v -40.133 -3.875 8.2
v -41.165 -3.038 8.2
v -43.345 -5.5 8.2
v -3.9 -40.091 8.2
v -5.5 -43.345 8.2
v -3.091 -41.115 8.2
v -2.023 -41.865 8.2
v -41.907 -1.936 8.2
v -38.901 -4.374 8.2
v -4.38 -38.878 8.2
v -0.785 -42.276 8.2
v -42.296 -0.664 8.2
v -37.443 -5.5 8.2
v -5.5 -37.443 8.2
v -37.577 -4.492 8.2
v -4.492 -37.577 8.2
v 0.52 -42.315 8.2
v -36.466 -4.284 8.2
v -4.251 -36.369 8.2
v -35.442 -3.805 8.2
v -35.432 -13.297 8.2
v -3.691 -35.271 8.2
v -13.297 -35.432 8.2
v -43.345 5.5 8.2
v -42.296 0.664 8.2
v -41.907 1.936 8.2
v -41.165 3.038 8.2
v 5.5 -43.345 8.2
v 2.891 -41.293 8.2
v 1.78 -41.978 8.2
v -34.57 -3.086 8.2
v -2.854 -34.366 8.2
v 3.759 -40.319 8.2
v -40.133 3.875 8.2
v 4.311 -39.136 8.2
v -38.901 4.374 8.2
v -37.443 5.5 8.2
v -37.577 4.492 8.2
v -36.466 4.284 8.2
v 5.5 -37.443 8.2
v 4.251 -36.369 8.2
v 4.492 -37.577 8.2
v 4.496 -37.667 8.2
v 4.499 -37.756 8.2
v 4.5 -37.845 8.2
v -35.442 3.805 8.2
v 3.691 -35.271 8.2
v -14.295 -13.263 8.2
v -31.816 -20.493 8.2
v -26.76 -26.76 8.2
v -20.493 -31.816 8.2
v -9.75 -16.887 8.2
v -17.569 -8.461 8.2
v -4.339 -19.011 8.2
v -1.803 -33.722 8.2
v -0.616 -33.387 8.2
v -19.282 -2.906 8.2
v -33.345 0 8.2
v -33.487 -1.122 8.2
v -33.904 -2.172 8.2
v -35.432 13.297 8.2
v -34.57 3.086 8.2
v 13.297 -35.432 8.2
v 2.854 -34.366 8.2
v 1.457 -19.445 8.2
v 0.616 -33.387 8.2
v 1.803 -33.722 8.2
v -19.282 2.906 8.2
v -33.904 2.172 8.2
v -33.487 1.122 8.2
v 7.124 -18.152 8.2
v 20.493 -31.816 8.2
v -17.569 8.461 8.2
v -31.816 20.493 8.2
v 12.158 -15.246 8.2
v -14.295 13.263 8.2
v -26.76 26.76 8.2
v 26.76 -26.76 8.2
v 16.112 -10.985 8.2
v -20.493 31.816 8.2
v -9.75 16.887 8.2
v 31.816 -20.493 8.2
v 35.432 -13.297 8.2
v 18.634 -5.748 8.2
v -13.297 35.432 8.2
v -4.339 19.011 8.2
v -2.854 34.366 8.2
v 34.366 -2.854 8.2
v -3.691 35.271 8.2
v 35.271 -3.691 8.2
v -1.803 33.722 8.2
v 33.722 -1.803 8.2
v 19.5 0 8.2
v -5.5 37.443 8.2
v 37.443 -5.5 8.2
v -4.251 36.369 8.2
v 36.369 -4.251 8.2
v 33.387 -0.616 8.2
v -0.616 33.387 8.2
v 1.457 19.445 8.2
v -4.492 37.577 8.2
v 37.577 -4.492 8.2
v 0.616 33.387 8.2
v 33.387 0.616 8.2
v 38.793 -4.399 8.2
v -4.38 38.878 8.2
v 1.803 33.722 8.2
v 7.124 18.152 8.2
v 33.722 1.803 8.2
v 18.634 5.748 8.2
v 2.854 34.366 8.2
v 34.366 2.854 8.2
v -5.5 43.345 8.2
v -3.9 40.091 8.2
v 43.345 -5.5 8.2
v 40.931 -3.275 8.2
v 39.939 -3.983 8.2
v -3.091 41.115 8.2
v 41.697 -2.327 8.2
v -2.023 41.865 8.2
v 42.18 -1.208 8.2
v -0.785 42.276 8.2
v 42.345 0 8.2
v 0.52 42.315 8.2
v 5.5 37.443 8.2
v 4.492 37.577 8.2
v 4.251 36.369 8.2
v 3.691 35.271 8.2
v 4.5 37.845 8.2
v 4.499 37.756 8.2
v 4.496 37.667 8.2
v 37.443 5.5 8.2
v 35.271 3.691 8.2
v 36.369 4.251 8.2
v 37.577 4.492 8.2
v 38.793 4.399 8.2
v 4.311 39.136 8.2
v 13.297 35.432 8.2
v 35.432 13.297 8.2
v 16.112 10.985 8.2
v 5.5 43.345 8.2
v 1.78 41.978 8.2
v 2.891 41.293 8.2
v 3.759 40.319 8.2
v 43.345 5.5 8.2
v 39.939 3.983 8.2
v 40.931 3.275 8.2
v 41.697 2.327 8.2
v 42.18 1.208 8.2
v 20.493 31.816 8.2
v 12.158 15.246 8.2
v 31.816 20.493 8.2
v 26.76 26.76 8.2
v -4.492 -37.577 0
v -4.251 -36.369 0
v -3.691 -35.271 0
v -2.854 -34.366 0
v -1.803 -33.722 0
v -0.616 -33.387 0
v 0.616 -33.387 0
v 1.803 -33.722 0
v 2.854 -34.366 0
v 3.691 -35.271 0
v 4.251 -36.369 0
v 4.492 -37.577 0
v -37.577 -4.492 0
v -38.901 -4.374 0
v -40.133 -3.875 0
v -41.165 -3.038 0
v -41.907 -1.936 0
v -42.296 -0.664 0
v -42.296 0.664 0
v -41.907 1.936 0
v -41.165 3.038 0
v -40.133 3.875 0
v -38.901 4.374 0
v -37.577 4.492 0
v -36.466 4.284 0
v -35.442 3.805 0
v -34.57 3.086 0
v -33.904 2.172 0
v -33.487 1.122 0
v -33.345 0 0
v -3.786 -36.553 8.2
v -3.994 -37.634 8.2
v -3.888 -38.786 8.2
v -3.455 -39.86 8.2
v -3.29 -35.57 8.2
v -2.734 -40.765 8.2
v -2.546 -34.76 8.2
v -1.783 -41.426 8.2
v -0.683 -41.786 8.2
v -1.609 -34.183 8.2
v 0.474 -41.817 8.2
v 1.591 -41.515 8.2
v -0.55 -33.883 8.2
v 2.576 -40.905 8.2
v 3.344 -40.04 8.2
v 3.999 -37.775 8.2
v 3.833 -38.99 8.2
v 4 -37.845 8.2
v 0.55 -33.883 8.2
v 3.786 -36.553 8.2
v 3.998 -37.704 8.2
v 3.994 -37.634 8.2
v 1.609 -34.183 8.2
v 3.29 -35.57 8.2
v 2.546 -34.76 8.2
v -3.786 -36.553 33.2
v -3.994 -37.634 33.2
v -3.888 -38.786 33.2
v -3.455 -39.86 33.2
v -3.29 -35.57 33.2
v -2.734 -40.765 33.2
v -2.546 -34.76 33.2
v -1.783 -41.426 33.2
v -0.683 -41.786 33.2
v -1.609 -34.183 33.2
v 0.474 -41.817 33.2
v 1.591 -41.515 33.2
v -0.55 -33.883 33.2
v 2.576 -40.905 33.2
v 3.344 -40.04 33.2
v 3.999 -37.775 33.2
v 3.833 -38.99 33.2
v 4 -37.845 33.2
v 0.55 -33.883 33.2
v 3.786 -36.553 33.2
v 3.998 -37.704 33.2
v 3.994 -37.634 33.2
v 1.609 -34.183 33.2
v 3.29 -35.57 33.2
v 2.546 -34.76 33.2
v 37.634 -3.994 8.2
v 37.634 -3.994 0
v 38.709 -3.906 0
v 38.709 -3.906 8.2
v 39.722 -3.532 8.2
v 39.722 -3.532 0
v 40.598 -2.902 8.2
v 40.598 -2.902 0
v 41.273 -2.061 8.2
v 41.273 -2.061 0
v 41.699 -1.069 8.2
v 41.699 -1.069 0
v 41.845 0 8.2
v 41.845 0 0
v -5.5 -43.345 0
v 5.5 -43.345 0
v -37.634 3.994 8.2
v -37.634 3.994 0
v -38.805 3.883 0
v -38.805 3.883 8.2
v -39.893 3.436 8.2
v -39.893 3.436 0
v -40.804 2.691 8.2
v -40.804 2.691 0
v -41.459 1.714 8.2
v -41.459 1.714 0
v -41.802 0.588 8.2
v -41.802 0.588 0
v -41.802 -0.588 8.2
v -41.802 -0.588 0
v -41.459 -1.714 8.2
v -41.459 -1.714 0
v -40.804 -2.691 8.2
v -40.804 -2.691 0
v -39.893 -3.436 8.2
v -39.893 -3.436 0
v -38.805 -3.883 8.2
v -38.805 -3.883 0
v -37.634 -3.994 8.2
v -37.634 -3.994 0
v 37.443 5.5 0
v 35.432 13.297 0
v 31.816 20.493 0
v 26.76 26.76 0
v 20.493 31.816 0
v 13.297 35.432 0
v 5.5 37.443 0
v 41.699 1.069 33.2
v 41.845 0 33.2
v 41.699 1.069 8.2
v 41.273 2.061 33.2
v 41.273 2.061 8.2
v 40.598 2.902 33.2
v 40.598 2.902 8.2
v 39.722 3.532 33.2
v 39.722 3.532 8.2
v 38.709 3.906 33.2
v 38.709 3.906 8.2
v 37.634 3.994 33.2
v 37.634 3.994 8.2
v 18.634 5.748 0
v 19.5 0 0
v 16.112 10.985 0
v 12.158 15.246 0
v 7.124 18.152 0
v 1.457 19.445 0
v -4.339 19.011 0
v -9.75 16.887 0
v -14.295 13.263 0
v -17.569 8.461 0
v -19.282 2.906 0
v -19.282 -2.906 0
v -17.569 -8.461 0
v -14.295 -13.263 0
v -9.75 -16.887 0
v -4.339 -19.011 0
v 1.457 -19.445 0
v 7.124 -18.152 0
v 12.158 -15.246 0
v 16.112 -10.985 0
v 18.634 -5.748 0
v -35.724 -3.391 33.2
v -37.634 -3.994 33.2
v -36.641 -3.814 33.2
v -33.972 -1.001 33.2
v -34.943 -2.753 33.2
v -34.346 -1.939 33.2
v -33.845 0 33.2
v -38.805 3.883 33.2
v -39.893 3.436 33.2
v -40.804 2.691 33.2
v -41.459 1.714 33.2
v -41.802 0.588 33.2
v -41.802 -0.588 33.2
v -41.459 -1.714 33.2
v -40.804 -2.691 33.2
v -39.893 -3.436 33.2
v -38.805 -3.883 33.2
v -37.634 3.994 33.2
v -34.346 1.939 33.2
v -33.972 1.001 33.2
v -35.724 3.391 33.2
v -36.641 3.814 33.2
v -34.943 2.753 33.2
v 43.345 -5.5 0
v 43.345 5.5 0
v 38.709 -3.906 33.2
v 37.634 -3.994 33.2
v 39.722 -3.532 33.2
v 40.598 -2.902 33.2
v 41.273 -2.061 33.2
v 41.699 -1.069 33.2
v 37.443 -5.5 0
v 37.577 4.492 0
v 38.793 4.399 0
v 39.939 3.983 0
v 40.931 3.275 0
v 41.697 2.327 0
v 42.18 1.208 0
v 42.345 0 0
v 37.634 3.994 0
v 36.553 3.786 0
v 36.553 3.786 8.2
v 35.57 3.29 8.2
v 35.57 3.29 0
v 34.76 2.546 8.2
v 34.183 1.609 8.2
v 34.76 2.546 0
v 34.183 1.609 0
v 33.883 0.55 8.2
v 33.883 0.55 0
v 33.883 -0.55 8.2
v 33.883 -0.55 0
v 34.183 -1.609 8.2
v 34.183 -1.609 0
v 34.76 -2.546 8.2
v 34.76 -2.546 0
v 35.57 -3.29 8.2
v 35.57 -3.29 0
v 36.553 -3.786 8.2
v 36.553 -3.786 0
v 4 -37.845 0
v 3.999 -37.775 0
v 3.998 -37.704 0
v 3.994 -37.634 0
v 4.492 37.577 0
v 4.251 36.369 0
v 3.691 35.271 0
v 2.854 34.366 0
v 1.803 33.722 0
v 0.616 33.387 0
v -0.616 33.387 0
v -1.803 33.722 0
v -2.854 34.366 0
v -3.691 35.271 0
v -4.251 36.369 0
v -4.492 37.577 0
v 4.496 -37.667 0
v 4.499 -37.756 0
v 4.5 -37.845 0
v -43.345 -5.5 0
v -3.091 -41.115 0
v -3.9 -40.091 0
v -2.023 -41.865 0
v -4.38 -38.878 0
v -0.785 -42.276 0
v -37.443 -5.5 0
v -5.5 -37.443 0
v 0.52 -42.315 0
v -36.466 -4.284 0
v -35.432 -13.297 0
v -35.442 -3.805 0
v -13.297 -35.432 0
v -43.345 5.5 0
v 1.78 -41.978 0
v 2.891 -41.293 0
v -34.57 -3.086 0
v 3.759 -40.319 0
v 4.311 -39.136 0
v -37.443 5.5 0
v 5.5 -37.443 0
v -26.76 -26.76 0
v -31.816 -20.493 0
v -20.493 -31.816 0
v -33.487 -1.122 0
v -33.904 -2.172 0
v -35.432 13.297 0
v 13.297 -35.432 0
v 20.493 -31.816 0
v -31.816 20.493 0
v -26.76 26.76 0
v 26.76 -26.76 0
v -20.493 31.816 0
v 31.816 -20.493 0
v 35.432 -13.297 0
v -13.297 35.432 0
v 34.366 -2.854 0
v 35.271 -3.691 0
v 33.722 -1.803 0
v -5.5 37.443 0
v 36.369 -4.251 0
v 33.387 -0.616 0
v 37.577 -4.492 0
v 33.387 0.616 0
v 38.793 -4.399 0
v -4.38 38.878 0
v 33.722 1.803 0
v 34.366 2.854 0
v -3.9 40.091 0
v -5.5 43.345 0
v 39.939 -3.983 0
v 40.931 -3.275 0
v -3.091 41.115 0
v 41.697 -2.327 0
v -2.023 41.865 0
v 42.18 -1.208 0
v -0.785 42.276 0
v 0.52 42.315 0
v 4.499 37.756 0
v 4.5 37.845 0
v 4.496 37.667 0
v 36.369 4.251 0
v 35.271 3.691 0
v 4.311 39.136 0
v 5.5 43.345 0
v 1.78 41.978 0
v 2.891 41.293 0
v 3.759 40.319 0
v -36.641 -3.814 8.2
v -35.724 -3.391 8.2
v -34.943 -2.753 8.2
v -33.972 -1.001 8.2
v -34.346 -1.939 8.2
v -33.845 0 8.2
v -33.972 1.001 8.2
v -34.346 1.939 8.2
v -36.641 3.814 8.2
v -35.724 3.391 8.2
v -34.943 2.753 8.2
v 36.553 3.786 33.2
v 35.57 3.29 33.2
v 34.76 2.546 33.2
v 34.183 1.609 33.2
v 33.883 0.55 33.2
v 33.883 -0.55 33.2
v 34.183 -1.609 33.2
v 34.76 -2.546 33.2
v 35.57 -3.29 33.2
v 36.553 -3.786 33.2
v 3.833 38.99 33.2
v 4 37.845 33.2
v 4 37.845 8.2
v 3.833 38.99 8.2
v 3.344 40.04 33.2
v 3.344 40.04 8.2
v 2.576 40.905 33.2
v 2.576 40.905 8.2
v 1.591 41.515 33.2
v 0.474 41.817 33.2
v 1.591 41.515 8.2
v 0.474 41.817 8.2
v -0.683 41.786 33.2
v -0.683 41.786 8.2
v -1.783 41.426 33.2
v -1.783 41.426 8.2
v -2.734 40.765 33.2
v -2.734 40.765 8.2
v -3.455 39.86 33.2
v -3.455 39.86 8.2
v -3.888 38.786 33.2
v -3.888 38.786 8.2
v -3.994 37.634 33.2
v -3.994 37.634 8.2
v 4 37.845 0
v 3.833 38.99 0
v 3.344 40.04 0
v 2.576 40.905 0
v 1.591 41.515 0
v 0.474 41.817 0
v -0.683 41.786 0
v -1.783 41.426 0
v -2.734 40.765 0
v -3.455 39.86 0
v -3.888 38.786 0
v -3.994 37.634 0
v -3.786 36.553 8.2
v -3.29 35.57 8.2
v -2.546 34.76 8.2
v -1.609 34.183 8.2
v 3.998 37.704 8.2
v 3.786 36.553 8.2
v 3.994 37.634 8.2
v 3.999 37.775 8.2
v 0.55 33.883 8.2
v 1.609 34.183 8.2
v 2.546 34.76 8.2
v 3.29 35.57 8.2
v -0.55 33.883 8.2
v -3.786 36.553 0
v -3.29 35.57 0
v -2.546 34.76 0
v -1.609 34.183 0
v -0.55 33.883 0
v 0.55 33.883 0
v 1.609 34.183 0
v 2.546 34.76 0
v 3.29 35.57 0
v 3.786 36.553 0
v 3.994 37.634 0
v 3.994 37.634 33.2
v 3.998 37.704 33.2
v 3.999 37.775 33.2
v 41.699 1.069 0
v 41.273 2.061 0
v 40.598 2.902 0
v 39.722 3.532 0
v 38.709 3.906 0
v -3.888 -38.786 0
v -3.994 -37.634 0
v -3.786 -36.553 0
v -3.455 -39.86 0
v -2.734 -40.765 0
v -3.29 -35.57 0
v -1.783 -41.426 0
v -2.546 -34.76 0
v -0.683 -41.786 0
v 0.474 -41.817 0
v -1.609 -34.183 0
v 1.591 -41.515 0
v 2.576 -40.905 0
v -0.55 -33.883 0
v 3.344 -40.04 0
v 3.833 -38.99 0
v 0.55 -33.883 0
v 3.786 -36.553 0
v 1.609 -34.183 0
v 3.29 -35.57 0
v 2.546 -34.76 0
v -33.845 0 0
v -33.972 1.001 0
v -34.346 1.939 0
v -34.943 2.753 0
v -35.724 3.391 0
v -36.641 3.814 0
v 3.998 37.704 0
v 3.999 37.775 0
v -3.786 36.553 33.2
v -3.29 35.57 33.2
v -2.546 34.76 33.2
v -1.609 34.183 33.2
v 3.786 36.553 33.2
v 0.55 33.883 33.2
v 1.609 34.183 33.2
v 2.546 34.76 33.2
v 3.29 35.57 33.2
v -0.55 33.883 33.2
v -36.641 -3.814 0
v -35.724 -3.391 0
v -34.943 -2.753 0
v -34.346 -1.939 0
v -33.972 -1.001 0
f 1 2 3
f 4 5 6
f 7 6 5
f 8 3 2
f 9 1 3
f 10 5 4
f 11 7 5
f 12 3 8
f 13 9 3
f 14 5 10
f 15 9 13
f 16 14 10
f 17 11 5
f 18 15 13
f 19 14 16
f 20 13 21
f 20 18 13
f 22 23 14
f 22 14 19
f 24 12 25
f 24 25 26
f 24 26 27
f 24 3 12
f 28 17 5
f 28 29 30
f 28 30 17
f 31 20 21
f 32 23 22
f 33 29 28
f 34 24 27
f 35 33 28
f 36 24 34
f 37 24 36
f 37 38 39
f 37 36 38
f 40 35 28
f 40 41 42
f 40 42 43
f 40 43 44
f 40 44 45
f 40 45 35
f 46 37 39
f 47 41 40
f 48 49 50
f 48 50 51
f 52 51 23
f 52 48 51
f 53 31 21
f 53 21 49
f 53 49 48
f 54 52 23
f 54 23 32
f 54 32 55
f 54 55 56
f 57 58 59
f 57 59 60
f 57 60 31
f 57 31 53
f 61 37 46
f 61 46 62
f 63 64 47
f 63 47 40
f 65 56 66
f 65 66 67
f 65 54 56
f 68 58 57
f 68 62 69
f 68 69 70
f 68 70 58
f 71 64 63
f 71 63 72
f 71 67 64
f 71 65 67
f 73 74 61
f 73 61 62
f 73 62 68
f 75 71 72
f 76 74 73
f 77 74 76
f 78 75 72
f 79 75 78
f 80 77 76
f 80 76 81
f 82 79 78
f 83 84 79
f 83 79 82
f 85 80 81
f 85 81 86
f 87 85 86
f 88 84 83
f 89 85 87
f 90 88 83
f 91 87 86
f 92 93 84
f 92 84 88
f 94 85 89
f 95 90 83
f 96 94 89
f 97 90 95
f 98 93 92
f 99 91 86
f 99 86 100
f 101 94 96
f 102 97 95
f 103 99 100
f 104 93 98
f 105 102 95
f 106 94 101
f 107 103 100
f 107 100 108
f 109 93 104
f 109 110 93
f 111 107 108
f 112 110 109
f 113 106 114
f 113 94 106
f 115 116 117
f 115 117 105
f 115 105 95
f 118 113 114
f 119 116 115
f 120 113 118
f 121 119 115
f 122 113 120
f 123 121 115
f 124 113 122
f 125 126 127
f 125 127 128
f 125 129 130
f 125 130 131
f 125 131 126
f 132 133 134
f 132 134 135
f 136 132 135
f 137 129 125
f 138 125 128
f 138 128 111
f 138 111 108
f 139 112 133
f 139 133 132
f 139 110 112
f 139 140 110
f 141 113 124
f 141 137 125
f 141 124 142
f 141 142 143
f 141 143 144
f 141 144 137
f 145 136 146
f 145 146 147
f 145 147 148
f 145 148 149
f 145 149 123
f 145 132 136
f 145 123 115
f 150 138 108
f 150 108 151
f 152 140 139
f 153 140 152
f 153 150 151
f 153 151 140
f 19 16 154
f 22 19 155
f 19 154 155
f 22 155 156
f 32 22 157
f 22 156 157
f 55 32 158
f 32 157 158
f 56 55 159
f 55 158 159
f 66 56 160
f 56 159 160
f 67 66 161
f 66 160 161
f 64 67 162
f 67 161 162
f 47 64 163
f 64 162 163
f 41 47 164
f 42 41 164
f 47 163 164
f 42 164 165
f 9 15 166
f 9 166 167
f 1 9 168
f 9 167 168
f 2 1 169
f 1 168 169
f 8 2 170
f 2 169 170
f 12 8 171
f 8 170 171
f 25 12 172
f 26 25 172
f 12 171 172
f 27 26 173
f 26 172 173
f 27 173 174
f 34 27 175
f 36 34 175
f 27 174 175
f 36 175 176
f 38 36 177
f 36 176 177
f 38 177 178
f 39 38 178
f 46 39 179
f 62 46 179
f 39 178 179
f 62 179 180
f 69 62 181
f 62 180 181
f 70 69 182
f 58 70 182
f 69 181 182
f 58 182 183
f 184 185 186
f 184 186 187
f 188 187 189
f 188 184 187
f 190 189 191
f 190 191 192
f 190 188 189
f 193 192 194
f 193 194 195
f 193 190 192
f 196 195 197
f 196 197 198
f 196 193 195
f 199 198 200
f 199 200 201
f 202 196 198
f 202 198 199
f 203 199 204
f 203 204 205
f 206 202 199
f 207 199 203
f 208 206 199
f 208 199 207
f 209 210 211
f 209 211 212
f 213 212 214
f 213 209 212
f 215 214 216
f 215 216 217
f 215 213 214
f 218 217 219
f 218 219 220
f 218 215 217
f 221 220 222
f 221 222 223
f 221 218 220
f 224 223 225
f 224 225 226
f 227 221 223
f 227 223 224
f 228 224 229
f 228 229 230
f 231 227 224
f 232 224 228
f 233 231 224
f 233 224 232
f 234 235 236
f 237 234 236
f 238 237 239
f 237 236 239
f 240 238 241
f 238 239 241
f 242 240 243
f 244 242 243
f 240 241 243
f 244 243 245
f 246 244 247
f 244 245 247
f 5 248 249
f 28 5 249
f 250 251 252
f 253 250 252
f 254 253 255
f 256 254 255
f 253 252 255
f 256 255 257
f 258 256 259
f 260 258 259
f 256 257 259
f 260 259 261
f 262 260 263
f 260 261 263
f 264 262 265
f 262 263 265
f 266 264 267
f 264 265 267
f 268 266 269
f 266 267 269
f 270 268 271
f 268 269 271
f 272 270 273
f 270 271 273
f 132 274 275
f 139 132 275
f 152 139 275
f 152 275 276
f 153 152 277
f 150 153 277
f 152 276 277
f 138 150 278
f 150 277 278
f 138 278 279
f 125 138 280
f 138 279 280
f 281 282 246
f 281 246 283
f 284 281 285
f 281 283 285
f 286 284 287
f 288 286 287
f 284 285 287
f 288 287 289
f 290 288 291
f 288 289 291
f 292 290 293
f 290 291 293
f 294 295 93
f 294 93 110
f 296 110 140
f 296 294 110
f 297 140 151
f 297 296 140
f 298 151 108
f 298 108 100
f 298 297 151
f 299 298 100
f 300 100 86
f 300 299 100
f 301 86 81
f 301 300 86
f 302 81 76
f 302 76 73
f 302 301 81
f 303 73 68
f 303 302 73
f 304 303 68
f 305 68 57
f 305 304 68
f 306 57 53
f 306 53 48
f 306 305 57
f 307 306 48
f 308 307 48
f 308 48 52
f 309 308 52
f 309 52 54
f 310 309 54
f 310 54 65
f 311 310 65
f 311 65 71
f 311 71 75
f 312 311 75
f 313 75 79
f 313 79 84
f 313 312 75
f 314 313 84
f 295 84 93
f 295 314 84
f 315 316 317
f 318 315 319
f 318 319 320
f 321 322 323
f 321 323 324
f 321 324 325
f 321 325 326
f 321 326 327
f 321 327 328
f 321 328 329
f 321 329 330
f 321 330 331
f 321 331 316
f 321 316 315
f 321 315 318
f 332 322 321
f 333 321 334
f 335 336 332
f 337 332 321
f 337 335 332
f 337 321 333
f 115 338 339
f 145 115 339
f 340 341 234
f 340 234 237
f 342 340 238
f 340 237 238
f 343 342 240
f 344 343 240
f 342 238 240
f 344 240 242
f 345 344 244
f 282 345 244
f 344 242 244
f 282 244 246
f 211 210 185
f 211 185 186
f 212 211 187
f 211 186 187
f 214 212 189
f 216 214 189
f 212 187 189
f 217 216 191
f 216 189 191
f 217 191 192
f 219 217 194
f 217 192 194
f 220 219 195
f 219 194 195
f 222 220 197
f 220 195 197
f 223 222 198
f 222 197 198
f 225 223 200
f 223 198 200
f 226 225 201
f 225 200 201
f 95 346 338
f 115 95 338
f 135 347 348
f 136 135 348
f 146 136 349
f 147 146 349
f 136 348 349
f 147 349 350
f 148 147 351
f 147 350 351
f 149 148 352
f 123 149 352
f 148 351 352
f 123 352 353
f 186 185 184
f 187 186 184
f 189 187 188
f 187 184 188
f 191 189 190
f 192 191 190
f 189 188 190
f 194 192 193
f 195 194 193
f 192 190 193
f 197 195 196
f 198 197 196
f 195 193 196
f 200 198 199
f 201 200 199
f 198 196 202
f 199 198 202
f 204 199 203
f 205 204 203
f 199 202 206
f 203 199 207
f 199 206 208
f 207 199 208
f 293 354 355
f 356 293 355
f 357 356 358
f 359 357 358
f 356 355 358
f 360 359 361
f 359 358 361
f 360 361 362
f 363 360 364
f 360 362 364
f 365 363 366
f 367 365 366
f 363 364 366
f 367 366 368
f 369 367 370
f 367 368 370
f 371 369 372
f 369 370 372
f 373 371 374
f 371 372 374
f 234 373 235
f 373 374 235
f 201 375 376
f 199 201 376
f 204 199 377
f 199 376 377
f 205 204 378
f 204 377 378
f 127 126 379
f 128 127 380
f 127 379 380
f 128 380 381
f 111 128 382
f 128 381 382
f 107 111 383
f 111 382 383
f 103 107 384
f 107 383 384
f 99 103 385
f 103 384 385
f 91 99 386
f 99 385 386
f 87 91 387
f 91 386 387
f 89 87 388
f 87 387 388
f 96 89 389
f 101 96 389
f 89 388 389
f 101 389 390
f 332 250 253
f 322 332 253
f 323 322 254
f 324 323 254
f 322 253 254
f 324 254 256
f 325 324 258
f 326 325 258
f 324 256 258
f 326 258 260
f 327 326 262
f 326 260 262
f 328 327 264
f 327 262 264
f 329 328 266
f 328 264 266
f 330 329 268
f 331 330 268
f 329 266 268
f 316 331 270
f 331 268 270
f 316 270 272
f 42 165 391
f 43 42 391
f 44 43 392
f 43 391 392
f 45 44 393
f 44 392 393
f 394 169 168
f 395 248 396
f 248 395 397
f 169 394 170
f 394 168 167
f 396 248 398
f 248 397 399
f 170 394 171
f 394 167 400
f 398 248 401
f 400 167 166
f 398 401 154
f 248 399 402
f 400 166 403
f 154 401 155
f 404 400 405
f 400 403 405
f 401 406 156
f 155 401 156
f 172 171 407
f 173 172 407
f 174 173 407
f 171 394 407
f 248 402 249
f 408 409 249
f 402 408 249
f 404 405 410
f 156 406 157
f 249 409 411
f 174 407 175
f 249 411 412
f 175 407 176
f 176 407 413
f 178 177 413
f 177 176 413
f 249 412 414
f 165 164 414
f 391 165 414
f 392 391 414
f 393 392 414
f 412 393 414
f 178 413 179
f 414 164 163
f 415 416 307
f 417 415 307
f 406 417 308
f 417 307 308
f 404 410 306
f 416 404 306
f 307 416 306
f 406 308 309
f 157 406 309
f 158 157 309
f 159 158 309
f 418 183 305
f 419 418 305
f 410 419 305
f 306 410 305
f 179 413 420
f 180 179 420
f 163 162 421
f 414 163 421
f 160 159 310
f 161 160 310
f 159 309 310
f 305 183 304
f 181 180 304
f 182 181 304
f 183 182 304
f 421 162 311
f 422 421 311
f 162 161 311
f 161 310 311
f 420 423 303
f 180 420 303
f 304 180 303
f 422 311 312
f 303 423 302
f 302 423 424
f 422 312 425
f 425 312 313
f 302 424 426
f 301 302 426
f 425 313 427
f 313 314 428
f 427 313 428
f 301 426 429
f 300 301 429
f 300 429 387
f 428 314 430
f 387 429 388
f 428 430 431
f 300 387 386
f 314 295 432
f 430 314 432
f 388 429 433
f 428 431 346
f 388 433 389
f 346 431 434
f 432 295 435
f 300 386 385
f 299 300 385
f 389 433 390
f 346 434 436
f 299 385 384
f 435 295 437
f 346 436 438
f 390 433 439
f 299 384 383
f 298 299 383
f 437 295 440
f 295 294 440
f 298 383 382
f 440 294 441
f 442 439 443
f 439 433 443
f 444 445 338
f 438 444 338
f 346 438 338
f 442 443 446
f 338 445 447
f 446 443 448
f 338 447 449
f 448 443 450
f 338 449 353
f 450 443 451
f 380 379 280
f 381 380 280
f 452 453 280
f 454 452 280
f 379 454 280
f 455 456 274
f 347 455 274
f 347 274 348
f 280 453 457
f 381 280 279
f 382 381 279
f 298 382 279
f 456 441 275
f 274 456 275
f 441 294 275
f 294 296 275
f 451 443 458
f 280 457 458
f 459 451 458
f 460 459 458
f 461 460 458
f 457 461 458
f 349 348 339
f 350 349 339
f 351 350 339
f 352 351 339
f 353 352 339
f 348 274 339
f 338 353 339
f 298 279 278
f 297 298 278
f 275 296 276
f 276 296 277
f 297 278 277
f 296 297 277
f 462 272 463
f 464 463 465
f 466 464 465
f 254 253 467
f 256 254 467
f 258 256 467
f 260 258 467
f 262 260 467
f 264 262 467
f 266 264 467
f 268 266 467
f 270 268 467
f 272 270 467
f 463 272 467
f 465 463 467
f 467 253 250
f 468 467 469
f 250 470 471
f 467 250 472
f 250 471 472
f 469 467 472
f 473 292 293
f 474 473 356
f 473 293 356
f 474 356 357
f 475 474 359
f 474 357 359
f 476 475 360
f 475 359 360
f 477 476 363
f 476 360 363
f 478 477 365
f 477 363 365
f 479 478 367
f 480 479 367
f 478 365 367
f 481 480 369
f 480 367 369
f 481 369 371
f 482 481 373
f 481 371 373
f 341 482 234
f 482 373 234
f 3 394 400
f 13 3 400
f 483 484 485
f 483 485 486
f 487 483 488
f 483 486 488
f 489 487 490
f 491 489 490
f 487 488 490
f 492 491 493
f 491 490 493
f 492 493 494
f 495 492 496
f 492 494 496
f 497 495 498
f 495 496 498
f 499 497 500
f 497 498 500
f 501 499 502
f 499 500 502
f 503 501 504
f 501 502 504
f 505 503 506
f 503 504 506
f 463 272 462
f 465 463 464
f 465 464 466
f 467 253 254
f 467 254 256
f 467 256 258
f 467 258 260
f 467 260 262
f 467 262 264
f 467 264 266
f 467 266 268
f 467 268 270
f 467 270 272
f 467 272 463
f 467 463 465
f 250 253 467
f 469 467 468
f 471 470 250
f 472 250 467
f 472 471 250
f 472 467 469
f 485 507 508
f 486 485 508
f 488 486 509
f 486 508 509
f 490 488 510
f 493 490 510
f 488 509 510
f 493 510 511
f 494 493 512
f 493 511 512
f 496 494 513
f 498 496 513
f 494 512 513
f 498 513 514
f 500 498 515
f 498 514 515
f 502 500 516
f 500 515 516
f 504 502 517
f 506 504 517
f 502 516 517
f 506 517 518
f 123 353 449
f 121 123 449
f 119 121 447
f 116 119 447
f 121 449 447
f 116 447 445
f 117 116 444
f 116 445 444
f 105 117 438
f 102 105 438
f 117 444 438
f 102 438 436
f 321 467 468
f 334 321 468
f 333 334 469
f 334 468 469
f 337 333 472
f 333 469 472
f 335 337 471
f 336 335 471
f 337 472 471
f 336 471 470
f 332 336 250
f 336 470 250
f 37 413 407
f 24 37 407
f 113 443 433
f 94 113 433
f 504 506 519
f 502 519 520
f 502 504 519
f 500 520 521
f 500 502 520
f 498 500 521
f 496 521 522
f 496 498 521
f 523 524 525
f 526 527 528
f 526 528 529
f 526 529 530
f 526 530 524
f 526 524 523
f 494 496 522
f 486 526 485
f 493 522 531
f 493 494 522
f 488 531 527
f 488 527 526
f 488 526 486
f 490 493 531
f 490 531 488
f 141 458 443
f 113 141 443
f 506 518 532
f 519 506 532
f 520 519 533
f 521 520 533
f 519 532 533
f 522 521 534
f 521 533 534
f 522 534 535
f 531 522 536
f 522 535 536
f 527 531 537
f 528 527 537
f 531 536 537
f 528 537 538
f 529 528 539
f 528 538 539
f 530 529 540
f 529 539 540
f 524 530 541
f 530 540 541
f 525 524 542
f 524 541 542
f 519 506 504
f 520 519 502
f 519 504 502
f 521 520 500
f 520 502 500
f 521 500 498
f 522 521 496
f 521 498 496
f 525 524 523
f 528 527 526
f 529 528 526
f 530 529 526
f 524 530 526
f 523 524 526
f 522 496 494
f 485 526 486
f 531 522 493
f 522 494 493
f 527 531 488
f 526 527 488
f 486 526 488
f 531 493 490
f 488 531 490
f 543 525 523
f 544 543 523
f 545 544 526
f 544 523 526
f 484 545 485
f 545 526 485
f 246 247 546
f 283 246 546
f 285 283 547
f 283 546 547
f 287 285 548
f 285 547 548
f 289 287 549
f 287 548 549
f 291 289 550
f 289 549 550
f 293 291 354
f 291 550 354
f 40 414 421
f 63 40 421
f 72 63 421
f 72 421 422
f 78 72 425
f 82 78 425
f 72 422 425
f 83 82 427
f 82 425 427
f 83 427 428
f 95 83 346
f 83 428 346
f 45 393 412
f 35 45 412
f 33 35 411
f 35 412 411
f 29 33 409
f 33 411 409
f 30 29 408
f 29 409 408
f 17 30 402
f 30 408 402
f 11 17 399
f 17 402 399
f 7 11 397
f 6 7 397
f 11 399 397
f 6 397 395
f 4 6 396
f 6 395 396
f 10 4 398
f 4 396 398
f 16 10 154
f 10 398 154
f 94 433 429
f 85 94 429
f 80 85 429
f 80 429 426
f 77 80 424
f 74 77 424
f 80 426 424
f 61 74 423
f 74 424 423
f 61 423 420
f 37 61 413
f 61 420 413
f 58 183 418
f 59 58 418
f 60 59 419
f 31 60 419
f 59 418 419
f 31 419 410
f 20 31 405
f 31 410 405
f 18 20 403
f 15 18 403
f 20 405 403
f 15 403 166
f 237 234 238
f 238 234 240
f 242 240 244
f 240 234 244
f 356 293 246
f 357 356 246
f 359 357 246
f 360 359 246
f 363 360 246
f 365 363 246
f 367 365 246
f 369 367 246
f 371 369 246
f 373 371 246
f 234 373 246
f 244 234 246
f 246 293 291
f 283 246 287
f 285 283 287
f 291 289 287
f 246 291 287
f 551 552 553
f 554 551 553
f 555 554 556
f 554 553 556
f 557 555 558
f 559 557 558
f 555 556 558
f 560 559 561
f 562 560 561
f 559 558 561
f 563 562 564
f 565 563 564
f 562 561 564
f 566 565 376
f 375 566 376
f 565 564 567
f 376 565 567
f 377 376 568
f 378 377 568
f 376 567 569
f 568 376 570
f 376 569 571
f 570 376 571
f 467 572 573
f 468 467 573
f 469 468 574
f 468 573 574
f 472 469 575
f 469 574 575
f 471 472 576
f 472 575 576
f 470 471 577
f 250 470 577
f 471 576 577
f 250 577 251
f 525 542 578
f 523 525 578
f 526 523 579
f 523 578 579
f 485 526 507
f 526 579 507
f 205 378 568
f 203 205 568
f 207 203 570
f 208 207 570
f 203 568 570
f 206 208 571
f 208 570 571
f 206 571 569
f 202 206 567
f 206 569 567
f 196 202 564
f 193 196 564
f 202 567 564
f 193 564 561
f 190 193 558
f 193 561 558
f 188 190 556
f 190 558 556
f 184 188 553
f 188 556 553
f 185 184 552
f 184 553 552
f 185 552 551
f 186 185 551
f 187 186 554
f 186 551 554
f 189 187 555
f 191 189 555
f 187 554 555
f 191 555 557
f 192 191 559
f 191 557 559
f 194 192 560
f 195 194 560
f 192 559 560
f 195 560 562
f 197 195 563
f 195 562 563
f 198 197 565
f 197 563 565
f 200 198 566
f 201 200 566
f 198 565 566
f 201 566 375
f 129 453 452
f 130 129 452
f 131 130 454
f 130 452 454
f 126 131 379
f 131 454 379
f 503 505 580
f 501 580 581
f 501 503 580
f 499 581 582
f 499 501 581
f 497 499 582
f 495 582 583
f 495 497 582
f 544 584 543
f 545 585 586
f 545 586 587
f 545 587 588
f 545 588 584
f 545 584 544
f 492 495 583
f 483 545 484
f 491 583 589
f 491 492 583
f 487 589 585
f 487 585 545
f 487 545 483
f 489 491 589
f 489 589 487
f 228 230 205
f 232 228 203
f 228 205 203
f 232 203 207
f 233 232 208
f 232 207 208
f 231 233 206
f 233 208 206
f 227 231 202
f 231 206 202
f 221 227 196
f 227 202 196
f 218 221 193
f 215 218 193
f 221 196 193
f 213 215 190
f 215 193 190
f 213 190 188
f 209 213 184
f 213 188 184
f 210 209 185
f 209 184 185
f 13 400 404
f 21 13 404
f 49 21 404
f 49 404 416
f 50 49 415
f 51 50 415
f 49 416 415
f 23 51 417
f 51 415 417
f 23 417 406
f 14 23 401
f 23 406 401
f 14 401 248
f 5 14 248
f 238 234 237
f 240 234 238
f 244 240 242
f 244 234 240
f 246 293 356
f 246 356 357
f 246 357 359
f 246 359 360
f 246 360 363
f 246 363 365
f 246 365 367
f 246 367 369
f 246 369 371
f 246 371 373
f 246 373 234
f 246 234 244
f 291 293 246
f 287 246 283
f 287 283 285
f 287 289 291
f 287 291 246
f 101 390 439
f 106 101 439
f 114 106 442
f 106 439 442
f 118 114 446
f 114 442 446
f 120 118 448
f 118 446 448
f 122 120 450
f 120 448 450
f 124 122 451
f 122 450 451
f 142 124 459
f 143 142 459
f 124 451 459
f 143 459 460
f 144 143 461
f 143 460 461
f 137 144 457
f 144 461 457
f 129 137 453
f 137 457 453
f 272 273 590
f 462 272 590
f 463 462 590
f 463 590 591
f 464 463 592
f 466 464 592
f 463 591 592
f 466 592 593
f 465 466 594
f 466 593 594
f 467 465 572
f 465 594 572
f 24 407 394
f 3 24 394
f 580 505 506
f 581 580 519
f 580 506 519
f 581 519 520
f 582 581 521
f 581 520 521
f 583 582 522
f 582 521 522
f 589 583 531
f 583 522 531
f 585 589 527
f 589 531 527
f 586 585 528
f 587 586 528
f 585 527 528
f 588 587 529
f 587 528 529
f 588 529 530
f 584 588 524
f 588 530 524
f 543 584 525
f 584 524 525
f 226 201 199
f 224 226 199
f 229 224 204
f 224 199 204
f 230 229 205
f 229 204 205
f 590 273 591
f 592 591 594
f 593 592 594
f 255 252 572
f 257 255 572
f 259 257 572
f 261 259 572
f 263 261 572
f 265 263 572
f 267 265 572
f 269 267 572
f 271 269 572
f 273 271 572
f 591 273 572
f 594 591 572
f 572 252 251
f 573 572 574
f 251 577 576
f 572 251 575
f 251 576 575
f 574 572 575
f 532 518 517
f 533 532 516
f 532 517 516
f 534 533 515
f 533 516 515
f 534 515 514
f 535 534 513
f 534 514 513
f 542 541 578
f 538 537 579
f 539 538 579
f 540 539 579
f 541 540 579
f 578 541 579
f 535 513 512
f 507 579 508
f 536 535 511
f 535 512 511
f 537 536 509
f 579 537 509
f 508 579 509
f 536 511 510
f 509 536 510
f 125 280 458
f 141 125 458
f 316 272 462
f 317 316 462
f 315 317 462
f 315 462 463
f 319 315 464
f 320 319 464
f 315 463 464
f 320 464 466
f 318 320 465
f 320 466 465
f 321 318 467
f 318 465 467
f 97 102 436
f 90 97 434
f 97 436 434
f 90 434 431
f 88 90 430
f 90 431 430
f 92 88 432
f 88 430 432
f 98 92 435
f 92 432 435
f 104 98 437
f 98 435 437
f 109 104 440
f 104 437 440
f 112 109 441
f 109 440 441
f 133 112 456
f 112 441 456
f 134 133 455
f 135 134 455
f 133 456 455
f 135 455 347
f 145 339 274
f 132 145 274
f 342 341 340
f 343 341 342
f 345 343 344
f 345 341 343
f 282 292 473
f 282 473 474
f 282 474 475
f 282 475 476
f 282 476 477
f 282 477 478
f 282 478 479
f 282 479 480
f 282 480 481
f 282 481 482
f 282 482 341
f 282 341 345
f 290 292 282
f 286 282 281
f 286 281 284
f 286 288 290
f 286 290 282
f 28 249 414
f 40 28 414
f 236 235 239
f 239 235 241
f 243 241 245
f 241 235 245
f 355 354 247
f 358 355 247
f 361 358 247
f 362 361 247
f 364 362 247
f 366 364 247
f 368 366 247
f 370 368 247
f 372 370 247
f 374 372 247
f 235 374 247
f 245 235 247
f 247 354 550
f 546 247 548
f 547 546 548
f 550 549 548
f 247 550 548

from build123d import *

# Parameters (mm, degrees)
F0_R     = 20
F0_R_2   = 19.5
F1_DEPTH = 8.2
F3_DEPTH = 25


# Not quite as in the source:
# - the program builds the solid bodies; features that only make, move or delete a surface that nothing else refers to are left out


with BuildPart() as f1:
    # F0 (on Top) → F1 (new body)
    with BuildSketch(Plane.XY):
        with BuildLine():
            ThreePointArc((37.5774613555, -4.492039968), (33.345, 0), (37.5774613555, 4.492039968))
            ThreePointArc((37.5774613555, 4.492039968), (37.5137215364, 4.9964709038), (37.4432106663, 5.5))
            Line((37.4432106663, 5.5), (32.345, 5.5))
            Line((32.345, 5.5), (32.345, -5.5))
            Line((32.345, -5.5), (37.4432106663, -5.5))
            ThreePointArc((37.4432106663, -5.5), (37.5137215364, -4.9964709038), (37.5774613555, -4.492039968))
        make_face()
        with BuildLine():
            ThreePointArc((37.4432106663, 5.5), (37.5137215364, 4.9964709038), (37.5774613555, 4.492039968))
            ThreePointArc((37.5774613555, 4.492039968), (40.9309420037, 3.2752041082), (42.345, 0))
            ThreePointArc((42.345, 0), (40.9309420037, -3.2752041082), (37.5774613555, -4.492039968))
            ThreePointArc((37.5774613555, -4.492039968), (37.5137215364, -4.9964709038), (37.4432106663, -5.5))
            Line((37.4432106663, -5.5), (43.345, -5.5))
            Line((43.345, -5.5), (43.345, 5.5))
            Line((43.345, 5.5), (37.4432106663, 5.5))
        make_face()
        with BuildLine():
            Line((32.345, 5.5), (37.4432106663, 5.5))
            ThreePointArc((37.4432106663, 5.5), (26.760456134, 26.760456134), (5.5, 37.4432106663))
            Line((5.5, 37.4432106663), (5.5, 32.345))
            Line((5.5, 32.345), (-5.5, 32.345))
            Line((-5.5, 32.345), (-5.5, 37.4432106663))
            ThreePointArc((-5.5, 37.4432106663), (-26.760456134, 26.760456134), (-37.4432106663, 5.5))
            Line((-37.4432106663, 5.5), (-32.345, 5.5))
            Line((-32.345, 5.5), (-32.345, -5.5))
            Line((-32.345, -5.5), (-37.4432106663, -5.5))
            ThreePointArc((-37.4432106663, -5.5), (-26.760456134, -26.760456134), (-5.5, -37.4432106663))
            Line((-5.5, -37.4432106663), (-5.5, -32.345))
            Line((-5.5, -32.345), (5.5, -32.345))
            Line((5.5, -32.345), (5.5, -37.4432106663))
            ThreePointArc((5.5, -37.4432106663), (26.760456134, -26.760456134), (37.4432106663, -5.5))
            Line((37.4432106663, -5.5), (32.345, -5.5))
            Line((32.345, -5.5), (32.345, 5.5))
        make_face()
        with BuildLine():
            ThreePointArc((23.3205760812, 16.9760053087), (27.4291454667, 8.9261416059), (28.845, 0))
            ThreePointArc((28.845, 0), (27.4291454667, -8.9261416059), (23.3205760812, -16.9760053087))
            ThreePointArc((23.3205760812, -16.9760053087), (24.483570121, -18.5134609029), (24.8964951033, -20.3964951033))
            ThreePointArc((24.8964951033, -20.3964951033), (21.9549873112, -24.6179998158), (16.9760053087, -23.3205760812))
            ThreePointArc((16.9760053087, -23.3205760812), (0, -28.845), (-16.9760053087, -23.3205760812))
            ThreePointArc((-16.9760053087, -23.3205760812), (-23.5784756187, -23.5784756187), (-23.3205760812, -16.9760053087))
            ThreePointArc((-23.3205760812, -16.9760053087), (-28.845, 0), (-23.3205760812, 16.9760053087))
            ThreePointArc((-23.3205760812, 16.9760053087), (-23.5784756187, 23.5784756187), (-16.9760053087, 23.3205760812))
            ThreePointArc((-16.9760053087, 23.3205760812), (0, 28.845), (16.9760053087, 23.3205760812))
            ThreePointArc((16.9760053087, 23.3205760812), (21.9549873112, 24.6179998158), (24.8964951033, 20.3964951033))
            ThreePointArc((24.8964951033, 20.3964951033), (24.483570121, 18.5134609029), (23.3205760812, 16.9760053087))
        make_face(mode=Mode.SUBTRACT)
        with BuildLine():
            Line((5.5, 32.345), (5.5, 37.4432106663))
            ThreePointArc((5.5, 37.4432106663), (4.9964709038, 37.5137215364), (4.492039968, 37.5774613555))
            ThreePointArc((4.492039968, 37.5774613555), (0, 33.345), (-4.492039968, 37.5774613555))
            ThreePointArc((-4.492039968, 37.5774613555), (-4.9964709038, 37.5137215364), (-5.5, 37.4432106663))
            Line((-5.5, 37.4432106663), (-5.5, 32.345))
            Line((-5.5, 32.345), (5.5, 32.345))
        make_face()
        with BuildLine():
            ThreePointArc((4.492039968, 37.5774613555), (4.9964709038, 37.5137215364), (5.5, 37.4432106663))
            Line((5.5, 37.4432106663), (5.5, 43.345))
            Line((5.5, 43.345), (-5.5, 43.345))
            Line((-5.5, 43.345), (-5.5, 37.4432106663))
            ThreePointArc((-5.5, 37.4432106663), (-4.9964709038, 37.5137215364), (-4.492039968, 37.5774613555))
            ThreePointArc((-4.492039968, 37.5774613555), (-0.1338285175, 42.3430095518), (4.5, 37.845))
            ThreePointArc((4.5, 37.845), (4.4980095518, 37.7111714825), (4.492039968, 37.5774613555))
        make_face()
        with BuildLine():
            Line((5.5, -43.345), (5.5, -37.4432106663))
            ThreePointArc((5.5, -37.4432106663), (4.9964709038, -37.5137215364), (4.492039968, -37.5774613555))
            ThreePointArc((4.492039968, -37.5774613555), (4.4980095518, -37.7111714825), (4.5, -37.845))
            ThreePointArc((4.5, -37.845), (-0.1338285175, -42.3430095518), (-4.492039968, -37.5774613555))
            ThreePointArc((-4.492039968, -37.5774613555), (-4.9964709038, -37.5137215364), (-5.5, -37.4432106663))
            Line((-5.5, -37.4432106663), (-5.5, -43.345))
            Line((-5.5, -43.345), (5.5, -43.345))
        make_face()
        with BuildLine():
            ThreePointArc((4.492039968, -37.5774613555), (4.9964709038, -37.5137215364), (5.5, -37.4432106663))
            Line((5.5, -37.4432106663), (5.5, -32.345))
            Line((5.5, -32.345), (-5.5, -32.345))
            Line((-5.5, -32.345), (-5.5, -37.4432106663))
            ThreePointArc((-5.5, -37.4432106663), (-4.9964709038, -37.5137215364), (-4.492039968, -37.5774613555))
            ThreePointArc((-4.492039968, -37.5774613555), (0, -33.345), (4.492039968, -37.5774613555))
        make_face()
        with BuildLine():
            Line((-32.345, 5.5), (-37.4432106663, 5.5))
            ThreePointArc((-37.4432106663, 5.5), (-37.5137215364, 4.9964709038), (-37.5774613555, 4.492039968))
            ThreePointArc((-37.5774613555, 4.492039968), (-34.5697958918, 3.0859420037), (-33.345, 0))
            ThreePointArc((-33.345, 0), (-34.5697958918, -3.0859420037), (-37.5774613555, -4.492039968))
            ThreePointArc((-37.5774613555, -4.492039968), (-37.5137215364, -4.9964709038), (-37.4432106663, -5.5))
            Line((-37.4432106663, -5.5), (-32.345, -5.5))
            Line((-32.345, -5.5), (-32.345, 5.5))
        make_face()
        with BuildLine():
            ThreePointArc((-37.5774613555, 4.492039968), (-37.5137215364, 4.9964709038), (-37.4432106663, 5.5))
            Line((-37.4432106663, 5.5), (-43.345, 5.5))
            Line((-43.345, 5.5), (-43.345, -5.5))
            Line((-43.345, -5.5), (-37.4432106663, -5.5))
            ThreePointArc((-37.4432106663, -5.5), (-37.5137215364, -4.9964709038), (-37.5774613555, -4.492039968))
            ThreePointArc((-37.5774613555, -4.492039968), (-42.345, 0), (-37.5774613555, 4.492039968))
        make_face()
        with BuildLine():
            ThreePointArc((-23.3205760812, 16.9760053087), (-20.3964951033, 20.3964951033), (-16.9760053087, 23.3205760812))
            ThreePointArc((-16.9760053087, 23.3205760812), (-23.5784756187, 23.5784756187), (-23.3205760812, 16.9760053087))
        make_face()
        with BuildLine():
            ThreePointArc((16.9760053087, 23.3205760812), (20.3964951033, 20.3964951033), (23.3205760812, 16.9760053087))
            ThreePointArc((23.3205760812, 16.9760053087), (24.483570121, 18.5134609029), (24.8964951033, 20.3964951033))
            ThreePointArc((24.8964951033, 20.3964951033), (21.9549873112, 24.6179998158), (16.9760053087, 23.3205760812))
        make_face()
        with BuildLine():
            ThreePointArc((24.8964951033, -20.3964951033), (24.483570121, -18.5134609029), (23.3205760812, -16.9760053087))
            ThreePointArc((23.3205760812, -16.9760053087), (20.3964951033, -20.3964951033), (16.9760053087, -23.3205760812))
            ThreePointArc((16.9760053087, -23.3205760812), (21.9549873112, -24.6179998158), (24.8964951033, -20.3964951033))
        make_face()
        with BuildLine():
            ThreePointArc((-23.3205760812, -16.9760053087), (-23.5784756187, -23.5784756187), (-16.9760053087, -23.3205760812))
            ThreePointArc((-16.9760053087, -23.3205760812), (-20.3964951033, -20.3964951033), (-23.3205760812, -16.9760053087))
        make_face()
        with BuildLine():
            ThreePointArc((23.3205760812, -16.9760053087), (27.4291454667, -8.9261416059), (28.845, 0))
            ThreePointArc((28.845, 0), (27.4291454667, 8.9261416059), (23.3205760812, 16.9760053087))
            ThreePointArc((23.3205760812, 16.9760053087), (17.214514588, 17.214514588), (16.9760053087, 23.3205760812))
            ThreePointArc((16.9760053087, 23.3205760812), (0, 28.845), (-16.9760053087, 23.3205760812))
            ThreePointArc((-16.9760053087, 23.3205760812), (-16.1749903908, 21.9549873112), (-15.8964951033, 20.3964951033))
            ThreePointArc((-15.8964951033, 20.3964951033), (-18.5134609029, 16.3094200856), (-23.3205760812, 16.9760053087))
            ThreePointArc((-23.3205760812, 16.9760053087), (-28.845, 0), (-23.3205760812, -16.9760053087))
            ThreePointArc((-23.3205760812, -16.9760053087), (-18.5134609029, -16.3094200856), (-15.8964951033, -20.3964951033))
            ThreePointArc((-15.8964951033, -20.3964951033), (-16.1749903908, -21.9549873112), (-16.9760053087, -23.3205760812))
            ThreePointArc((-16.9760053087, -23.3205760812), (0, -28.845), (16.9760053087, -23.3205760812))
            ThreePointArc((16.9760053087, -23.3205760812), (17.214514588, -17.214514588), (23.3205760812, -16.9760053087))
        make_face()
        Circle(F0_R, mode=Mode.SUBTRACT)
        with BuildLine():
            ThreePointArc((16.9760053087, -23.3205760812), (20.3964951033, -20.3964951033), (23.3205760812, -16.9760053087))
            ThreePointArc((23.3205760812, -16.9760053087), (17.214514588, -17.214514588), (16.9760053087, -23.3205760812))
        make_face()
        with BuildLine():
            ThreePointArc((16.9760053087, 23.3205760812), (17.214514588, 17.214514588), (23.3205760812, 16.9760053087))
            ThreePointArc((23.3205760812, 16.9760053087), (20.3964951033, 20.3964951033), (16.9760053087, 23.3205760812))
        make_face()
        with BuildLine():
            ThreePointArc((-15.8964951033, 20.3964951033), (-16.1749903908, 21.9549873112), (-16.9760053087, 23.3205760812))
            ThreePointArc((-16.9760053087, 23.3205760812), (-20.3964951033, 20.3964951033), (-23.3205760812, 16.9760053087))
            ThreePointArc((-23.3205760812, 16.9760053087), (-18.5134609029, 16.3094200856), (-15.8964951033, 20.3964951033))
        make_face()
        with BuildLine():
            ThreePointArc((-23.3205760812, -16.9760053087), (-20.3964951033, -20.3964951033), (-16.9760053087, -23.3205760812))
            ThreePointArc((-16.9760053087, -23.3205760812), (-16.1749903908, -21.9549873112), (-15.8964951033, -20.3964951033))
            ThreePointArc((-15.8964951033, -20.3964951033), (-18.5134609029, -16.3094200856), (-23.3205760812, -16.9760053087))
        make_face()
        Circle(F0_R)
        Circle(F0_R_2, mode=Mode.SUBTRACT)
    extrude(amount=F1_DEPTH)


with BuildPart() as f1b:
    # F0 (on Top) → F1, piece 2 (new body)
    with BuildSketch(Plane.XY):
        with BuildLine():
            ThreePointArc((-37.6336114414, -3.9944104543), (-37.845, 0), (-37.6336114414, 3.9944104543))
            ThreePointArc((-37.6336114414, 3.9944104543), (-41.845, 0), (-37.6336114414, -3.9944104543))
        make_face()
        with BuildLine():
            ThreePointArc((-33.845, 0), (-34.9427978848, 2.7526755862), (-37.6336114414, 3.9944104543))
            ThreePointArc((-37.6336114414, 3.9944104543), (-37.845, 0), (-37.6336114414, -3.9944104543))
            ThreePointArc((-37.6336114414, -3.9944104543), (-34.9427978848, -2.7526755862), (-33.845, 0))
        make_face()
    extrude(amount=F1_DEPTH)


with BuildPart() as f1c:
    # F0 (on Top) → F1, piece 3 (new body)
    with BuildSketch(Plane.XY):
        with BuildLine():
            ThreePointArc((-3.9944104543, 37.6336114414), (0, 37.845), (3.9944104543, 37.6336114414))
            ThreePointArc((3.9944104543, 37.6336114414), (3.9986023694, 37.7392687774), (4, 37.845))
            ThreePointArc((4, 37.845), (-0.1057312226, 41.8436023694), (-3.9944104543, 37.6336114414))
        make_face()
        with BuildLine():
            ThreePointArc((-3.9944104543, 37.6336114414), (0, 33.845), (3.9944104543, 37.6336114414))
            ThreePointArc((3.9944104543, 37.6336114414), (0, 37.845), (-3.9944104543, 37.6336114414))
        make_face()
    extrude(amount=F1_DEPTH)


with BuildPart() as f1d:
    # F0 (on Top) → F1, piece 4 (new body)
    with BuildSketch(Plane.XY):
        with BuildLine():
            ThreePointArc((37.6336114414, -3.9944104543), (37.7921159106, -2), (37.845, 0))
            ThreePointArc((37.845, 0), (37.7921159106, 2), (37.6336114414, 3.9944104543))
            ThreePointArc((37.6336114414, 3.9944104543), (33.845, 0), (37.6336114414, -3.9944104543))
        make_face()
        with BuildLine():
            ThreePointArc((37.6336114414, 3.9944104543), (37.7921159106, 2), (37.845, 0))
            ThreePointArc((37.845, 0), (37.7921159106, -2), (37.6336114414, -3.9944104543))
            ThreePointArc((37.6336114414, -3.9944104543), (40.5976755862, -2.9022021152), (41.845, 0))
            ThreePointArc((41.845, 0), (40.5976755862, 2.9022021152), (37.6336114414, 3.9944104543))
        make_face()
    extrude(amount=F1_DEPTH)


with BuildPart() as f1e:
    # F0 (on Top) → F1, piece 5 (new body)
    with BuildSketch(Plane.XY):
        with BuildLine():
            ThreePointArc((-3.9944104543, -37.6336114414), (0, -37.845), (3.9944104543, -37.6336114414))
            ThreePointArc((3.9944104543, -37.6336114414), (0, -33.845), (-3.9944104543, -37.6336114414))
        make_face()
        with BuildLine():
            ThreePointArc((4, -37.845), (3.9986023694, -37.7392687774), (3.9944104543, -37.6336114414))
            ThreePointArc((3.9944104543, -37.6336114414), (0, -37.845), (-3.9944104543, -37.6336114414))
            ThreePointArc((-3.9944104543, -37.6336114414), (-0.1057312226, -41.8436023694), (4, -37.845))
        make_face()
    extrude(amount=F1_DEPTH)


with BuildPart() as f3:
    # F3 (new): a face of the model
    f3_faces = [f1c.part.faces().sort_by_distance(p)[0] for p in [
        (0, 37.845, 8.2),
    ]]
    extrude(f3_faces, amount=F3_DEPTH)


with BuildPart() as f3b:
    # F3#2 (new): a face of the model
    f3_2_faces = [f1b.part.faces().sort_by_distance(p)[0] for p in [
        (-37.845, 0, 8.2),
    ]]
    extrude(f3_2_faces, amount=F3_DEPTH)


with BuildPart() as f3c:
    # F3#3 (new): a face of the model
    f3_3_faces = [f1d.part.faces().sort_by_distance(p)[0] for p in [
        (37.845, 0, 8.2),
    ]]
    extrude(f3_3_faces, amount=F3_DEPTH)


with BuildPart() as f3d:
    # F3#4 (new): a face of the model
    f3_4_faces = [f1e.part.faces().sort_by_distance(p)[0] for p in [
        (0, -37.845, 8.2),
    ]]
    extrude(f3_4_faces, amount=F3_DEPTH)


solid = Compound([f1.part, f1b.part, f1c.part, f1d.part, f1e.part, f3.part, f3b.part, f3c.part, f3d.part])
